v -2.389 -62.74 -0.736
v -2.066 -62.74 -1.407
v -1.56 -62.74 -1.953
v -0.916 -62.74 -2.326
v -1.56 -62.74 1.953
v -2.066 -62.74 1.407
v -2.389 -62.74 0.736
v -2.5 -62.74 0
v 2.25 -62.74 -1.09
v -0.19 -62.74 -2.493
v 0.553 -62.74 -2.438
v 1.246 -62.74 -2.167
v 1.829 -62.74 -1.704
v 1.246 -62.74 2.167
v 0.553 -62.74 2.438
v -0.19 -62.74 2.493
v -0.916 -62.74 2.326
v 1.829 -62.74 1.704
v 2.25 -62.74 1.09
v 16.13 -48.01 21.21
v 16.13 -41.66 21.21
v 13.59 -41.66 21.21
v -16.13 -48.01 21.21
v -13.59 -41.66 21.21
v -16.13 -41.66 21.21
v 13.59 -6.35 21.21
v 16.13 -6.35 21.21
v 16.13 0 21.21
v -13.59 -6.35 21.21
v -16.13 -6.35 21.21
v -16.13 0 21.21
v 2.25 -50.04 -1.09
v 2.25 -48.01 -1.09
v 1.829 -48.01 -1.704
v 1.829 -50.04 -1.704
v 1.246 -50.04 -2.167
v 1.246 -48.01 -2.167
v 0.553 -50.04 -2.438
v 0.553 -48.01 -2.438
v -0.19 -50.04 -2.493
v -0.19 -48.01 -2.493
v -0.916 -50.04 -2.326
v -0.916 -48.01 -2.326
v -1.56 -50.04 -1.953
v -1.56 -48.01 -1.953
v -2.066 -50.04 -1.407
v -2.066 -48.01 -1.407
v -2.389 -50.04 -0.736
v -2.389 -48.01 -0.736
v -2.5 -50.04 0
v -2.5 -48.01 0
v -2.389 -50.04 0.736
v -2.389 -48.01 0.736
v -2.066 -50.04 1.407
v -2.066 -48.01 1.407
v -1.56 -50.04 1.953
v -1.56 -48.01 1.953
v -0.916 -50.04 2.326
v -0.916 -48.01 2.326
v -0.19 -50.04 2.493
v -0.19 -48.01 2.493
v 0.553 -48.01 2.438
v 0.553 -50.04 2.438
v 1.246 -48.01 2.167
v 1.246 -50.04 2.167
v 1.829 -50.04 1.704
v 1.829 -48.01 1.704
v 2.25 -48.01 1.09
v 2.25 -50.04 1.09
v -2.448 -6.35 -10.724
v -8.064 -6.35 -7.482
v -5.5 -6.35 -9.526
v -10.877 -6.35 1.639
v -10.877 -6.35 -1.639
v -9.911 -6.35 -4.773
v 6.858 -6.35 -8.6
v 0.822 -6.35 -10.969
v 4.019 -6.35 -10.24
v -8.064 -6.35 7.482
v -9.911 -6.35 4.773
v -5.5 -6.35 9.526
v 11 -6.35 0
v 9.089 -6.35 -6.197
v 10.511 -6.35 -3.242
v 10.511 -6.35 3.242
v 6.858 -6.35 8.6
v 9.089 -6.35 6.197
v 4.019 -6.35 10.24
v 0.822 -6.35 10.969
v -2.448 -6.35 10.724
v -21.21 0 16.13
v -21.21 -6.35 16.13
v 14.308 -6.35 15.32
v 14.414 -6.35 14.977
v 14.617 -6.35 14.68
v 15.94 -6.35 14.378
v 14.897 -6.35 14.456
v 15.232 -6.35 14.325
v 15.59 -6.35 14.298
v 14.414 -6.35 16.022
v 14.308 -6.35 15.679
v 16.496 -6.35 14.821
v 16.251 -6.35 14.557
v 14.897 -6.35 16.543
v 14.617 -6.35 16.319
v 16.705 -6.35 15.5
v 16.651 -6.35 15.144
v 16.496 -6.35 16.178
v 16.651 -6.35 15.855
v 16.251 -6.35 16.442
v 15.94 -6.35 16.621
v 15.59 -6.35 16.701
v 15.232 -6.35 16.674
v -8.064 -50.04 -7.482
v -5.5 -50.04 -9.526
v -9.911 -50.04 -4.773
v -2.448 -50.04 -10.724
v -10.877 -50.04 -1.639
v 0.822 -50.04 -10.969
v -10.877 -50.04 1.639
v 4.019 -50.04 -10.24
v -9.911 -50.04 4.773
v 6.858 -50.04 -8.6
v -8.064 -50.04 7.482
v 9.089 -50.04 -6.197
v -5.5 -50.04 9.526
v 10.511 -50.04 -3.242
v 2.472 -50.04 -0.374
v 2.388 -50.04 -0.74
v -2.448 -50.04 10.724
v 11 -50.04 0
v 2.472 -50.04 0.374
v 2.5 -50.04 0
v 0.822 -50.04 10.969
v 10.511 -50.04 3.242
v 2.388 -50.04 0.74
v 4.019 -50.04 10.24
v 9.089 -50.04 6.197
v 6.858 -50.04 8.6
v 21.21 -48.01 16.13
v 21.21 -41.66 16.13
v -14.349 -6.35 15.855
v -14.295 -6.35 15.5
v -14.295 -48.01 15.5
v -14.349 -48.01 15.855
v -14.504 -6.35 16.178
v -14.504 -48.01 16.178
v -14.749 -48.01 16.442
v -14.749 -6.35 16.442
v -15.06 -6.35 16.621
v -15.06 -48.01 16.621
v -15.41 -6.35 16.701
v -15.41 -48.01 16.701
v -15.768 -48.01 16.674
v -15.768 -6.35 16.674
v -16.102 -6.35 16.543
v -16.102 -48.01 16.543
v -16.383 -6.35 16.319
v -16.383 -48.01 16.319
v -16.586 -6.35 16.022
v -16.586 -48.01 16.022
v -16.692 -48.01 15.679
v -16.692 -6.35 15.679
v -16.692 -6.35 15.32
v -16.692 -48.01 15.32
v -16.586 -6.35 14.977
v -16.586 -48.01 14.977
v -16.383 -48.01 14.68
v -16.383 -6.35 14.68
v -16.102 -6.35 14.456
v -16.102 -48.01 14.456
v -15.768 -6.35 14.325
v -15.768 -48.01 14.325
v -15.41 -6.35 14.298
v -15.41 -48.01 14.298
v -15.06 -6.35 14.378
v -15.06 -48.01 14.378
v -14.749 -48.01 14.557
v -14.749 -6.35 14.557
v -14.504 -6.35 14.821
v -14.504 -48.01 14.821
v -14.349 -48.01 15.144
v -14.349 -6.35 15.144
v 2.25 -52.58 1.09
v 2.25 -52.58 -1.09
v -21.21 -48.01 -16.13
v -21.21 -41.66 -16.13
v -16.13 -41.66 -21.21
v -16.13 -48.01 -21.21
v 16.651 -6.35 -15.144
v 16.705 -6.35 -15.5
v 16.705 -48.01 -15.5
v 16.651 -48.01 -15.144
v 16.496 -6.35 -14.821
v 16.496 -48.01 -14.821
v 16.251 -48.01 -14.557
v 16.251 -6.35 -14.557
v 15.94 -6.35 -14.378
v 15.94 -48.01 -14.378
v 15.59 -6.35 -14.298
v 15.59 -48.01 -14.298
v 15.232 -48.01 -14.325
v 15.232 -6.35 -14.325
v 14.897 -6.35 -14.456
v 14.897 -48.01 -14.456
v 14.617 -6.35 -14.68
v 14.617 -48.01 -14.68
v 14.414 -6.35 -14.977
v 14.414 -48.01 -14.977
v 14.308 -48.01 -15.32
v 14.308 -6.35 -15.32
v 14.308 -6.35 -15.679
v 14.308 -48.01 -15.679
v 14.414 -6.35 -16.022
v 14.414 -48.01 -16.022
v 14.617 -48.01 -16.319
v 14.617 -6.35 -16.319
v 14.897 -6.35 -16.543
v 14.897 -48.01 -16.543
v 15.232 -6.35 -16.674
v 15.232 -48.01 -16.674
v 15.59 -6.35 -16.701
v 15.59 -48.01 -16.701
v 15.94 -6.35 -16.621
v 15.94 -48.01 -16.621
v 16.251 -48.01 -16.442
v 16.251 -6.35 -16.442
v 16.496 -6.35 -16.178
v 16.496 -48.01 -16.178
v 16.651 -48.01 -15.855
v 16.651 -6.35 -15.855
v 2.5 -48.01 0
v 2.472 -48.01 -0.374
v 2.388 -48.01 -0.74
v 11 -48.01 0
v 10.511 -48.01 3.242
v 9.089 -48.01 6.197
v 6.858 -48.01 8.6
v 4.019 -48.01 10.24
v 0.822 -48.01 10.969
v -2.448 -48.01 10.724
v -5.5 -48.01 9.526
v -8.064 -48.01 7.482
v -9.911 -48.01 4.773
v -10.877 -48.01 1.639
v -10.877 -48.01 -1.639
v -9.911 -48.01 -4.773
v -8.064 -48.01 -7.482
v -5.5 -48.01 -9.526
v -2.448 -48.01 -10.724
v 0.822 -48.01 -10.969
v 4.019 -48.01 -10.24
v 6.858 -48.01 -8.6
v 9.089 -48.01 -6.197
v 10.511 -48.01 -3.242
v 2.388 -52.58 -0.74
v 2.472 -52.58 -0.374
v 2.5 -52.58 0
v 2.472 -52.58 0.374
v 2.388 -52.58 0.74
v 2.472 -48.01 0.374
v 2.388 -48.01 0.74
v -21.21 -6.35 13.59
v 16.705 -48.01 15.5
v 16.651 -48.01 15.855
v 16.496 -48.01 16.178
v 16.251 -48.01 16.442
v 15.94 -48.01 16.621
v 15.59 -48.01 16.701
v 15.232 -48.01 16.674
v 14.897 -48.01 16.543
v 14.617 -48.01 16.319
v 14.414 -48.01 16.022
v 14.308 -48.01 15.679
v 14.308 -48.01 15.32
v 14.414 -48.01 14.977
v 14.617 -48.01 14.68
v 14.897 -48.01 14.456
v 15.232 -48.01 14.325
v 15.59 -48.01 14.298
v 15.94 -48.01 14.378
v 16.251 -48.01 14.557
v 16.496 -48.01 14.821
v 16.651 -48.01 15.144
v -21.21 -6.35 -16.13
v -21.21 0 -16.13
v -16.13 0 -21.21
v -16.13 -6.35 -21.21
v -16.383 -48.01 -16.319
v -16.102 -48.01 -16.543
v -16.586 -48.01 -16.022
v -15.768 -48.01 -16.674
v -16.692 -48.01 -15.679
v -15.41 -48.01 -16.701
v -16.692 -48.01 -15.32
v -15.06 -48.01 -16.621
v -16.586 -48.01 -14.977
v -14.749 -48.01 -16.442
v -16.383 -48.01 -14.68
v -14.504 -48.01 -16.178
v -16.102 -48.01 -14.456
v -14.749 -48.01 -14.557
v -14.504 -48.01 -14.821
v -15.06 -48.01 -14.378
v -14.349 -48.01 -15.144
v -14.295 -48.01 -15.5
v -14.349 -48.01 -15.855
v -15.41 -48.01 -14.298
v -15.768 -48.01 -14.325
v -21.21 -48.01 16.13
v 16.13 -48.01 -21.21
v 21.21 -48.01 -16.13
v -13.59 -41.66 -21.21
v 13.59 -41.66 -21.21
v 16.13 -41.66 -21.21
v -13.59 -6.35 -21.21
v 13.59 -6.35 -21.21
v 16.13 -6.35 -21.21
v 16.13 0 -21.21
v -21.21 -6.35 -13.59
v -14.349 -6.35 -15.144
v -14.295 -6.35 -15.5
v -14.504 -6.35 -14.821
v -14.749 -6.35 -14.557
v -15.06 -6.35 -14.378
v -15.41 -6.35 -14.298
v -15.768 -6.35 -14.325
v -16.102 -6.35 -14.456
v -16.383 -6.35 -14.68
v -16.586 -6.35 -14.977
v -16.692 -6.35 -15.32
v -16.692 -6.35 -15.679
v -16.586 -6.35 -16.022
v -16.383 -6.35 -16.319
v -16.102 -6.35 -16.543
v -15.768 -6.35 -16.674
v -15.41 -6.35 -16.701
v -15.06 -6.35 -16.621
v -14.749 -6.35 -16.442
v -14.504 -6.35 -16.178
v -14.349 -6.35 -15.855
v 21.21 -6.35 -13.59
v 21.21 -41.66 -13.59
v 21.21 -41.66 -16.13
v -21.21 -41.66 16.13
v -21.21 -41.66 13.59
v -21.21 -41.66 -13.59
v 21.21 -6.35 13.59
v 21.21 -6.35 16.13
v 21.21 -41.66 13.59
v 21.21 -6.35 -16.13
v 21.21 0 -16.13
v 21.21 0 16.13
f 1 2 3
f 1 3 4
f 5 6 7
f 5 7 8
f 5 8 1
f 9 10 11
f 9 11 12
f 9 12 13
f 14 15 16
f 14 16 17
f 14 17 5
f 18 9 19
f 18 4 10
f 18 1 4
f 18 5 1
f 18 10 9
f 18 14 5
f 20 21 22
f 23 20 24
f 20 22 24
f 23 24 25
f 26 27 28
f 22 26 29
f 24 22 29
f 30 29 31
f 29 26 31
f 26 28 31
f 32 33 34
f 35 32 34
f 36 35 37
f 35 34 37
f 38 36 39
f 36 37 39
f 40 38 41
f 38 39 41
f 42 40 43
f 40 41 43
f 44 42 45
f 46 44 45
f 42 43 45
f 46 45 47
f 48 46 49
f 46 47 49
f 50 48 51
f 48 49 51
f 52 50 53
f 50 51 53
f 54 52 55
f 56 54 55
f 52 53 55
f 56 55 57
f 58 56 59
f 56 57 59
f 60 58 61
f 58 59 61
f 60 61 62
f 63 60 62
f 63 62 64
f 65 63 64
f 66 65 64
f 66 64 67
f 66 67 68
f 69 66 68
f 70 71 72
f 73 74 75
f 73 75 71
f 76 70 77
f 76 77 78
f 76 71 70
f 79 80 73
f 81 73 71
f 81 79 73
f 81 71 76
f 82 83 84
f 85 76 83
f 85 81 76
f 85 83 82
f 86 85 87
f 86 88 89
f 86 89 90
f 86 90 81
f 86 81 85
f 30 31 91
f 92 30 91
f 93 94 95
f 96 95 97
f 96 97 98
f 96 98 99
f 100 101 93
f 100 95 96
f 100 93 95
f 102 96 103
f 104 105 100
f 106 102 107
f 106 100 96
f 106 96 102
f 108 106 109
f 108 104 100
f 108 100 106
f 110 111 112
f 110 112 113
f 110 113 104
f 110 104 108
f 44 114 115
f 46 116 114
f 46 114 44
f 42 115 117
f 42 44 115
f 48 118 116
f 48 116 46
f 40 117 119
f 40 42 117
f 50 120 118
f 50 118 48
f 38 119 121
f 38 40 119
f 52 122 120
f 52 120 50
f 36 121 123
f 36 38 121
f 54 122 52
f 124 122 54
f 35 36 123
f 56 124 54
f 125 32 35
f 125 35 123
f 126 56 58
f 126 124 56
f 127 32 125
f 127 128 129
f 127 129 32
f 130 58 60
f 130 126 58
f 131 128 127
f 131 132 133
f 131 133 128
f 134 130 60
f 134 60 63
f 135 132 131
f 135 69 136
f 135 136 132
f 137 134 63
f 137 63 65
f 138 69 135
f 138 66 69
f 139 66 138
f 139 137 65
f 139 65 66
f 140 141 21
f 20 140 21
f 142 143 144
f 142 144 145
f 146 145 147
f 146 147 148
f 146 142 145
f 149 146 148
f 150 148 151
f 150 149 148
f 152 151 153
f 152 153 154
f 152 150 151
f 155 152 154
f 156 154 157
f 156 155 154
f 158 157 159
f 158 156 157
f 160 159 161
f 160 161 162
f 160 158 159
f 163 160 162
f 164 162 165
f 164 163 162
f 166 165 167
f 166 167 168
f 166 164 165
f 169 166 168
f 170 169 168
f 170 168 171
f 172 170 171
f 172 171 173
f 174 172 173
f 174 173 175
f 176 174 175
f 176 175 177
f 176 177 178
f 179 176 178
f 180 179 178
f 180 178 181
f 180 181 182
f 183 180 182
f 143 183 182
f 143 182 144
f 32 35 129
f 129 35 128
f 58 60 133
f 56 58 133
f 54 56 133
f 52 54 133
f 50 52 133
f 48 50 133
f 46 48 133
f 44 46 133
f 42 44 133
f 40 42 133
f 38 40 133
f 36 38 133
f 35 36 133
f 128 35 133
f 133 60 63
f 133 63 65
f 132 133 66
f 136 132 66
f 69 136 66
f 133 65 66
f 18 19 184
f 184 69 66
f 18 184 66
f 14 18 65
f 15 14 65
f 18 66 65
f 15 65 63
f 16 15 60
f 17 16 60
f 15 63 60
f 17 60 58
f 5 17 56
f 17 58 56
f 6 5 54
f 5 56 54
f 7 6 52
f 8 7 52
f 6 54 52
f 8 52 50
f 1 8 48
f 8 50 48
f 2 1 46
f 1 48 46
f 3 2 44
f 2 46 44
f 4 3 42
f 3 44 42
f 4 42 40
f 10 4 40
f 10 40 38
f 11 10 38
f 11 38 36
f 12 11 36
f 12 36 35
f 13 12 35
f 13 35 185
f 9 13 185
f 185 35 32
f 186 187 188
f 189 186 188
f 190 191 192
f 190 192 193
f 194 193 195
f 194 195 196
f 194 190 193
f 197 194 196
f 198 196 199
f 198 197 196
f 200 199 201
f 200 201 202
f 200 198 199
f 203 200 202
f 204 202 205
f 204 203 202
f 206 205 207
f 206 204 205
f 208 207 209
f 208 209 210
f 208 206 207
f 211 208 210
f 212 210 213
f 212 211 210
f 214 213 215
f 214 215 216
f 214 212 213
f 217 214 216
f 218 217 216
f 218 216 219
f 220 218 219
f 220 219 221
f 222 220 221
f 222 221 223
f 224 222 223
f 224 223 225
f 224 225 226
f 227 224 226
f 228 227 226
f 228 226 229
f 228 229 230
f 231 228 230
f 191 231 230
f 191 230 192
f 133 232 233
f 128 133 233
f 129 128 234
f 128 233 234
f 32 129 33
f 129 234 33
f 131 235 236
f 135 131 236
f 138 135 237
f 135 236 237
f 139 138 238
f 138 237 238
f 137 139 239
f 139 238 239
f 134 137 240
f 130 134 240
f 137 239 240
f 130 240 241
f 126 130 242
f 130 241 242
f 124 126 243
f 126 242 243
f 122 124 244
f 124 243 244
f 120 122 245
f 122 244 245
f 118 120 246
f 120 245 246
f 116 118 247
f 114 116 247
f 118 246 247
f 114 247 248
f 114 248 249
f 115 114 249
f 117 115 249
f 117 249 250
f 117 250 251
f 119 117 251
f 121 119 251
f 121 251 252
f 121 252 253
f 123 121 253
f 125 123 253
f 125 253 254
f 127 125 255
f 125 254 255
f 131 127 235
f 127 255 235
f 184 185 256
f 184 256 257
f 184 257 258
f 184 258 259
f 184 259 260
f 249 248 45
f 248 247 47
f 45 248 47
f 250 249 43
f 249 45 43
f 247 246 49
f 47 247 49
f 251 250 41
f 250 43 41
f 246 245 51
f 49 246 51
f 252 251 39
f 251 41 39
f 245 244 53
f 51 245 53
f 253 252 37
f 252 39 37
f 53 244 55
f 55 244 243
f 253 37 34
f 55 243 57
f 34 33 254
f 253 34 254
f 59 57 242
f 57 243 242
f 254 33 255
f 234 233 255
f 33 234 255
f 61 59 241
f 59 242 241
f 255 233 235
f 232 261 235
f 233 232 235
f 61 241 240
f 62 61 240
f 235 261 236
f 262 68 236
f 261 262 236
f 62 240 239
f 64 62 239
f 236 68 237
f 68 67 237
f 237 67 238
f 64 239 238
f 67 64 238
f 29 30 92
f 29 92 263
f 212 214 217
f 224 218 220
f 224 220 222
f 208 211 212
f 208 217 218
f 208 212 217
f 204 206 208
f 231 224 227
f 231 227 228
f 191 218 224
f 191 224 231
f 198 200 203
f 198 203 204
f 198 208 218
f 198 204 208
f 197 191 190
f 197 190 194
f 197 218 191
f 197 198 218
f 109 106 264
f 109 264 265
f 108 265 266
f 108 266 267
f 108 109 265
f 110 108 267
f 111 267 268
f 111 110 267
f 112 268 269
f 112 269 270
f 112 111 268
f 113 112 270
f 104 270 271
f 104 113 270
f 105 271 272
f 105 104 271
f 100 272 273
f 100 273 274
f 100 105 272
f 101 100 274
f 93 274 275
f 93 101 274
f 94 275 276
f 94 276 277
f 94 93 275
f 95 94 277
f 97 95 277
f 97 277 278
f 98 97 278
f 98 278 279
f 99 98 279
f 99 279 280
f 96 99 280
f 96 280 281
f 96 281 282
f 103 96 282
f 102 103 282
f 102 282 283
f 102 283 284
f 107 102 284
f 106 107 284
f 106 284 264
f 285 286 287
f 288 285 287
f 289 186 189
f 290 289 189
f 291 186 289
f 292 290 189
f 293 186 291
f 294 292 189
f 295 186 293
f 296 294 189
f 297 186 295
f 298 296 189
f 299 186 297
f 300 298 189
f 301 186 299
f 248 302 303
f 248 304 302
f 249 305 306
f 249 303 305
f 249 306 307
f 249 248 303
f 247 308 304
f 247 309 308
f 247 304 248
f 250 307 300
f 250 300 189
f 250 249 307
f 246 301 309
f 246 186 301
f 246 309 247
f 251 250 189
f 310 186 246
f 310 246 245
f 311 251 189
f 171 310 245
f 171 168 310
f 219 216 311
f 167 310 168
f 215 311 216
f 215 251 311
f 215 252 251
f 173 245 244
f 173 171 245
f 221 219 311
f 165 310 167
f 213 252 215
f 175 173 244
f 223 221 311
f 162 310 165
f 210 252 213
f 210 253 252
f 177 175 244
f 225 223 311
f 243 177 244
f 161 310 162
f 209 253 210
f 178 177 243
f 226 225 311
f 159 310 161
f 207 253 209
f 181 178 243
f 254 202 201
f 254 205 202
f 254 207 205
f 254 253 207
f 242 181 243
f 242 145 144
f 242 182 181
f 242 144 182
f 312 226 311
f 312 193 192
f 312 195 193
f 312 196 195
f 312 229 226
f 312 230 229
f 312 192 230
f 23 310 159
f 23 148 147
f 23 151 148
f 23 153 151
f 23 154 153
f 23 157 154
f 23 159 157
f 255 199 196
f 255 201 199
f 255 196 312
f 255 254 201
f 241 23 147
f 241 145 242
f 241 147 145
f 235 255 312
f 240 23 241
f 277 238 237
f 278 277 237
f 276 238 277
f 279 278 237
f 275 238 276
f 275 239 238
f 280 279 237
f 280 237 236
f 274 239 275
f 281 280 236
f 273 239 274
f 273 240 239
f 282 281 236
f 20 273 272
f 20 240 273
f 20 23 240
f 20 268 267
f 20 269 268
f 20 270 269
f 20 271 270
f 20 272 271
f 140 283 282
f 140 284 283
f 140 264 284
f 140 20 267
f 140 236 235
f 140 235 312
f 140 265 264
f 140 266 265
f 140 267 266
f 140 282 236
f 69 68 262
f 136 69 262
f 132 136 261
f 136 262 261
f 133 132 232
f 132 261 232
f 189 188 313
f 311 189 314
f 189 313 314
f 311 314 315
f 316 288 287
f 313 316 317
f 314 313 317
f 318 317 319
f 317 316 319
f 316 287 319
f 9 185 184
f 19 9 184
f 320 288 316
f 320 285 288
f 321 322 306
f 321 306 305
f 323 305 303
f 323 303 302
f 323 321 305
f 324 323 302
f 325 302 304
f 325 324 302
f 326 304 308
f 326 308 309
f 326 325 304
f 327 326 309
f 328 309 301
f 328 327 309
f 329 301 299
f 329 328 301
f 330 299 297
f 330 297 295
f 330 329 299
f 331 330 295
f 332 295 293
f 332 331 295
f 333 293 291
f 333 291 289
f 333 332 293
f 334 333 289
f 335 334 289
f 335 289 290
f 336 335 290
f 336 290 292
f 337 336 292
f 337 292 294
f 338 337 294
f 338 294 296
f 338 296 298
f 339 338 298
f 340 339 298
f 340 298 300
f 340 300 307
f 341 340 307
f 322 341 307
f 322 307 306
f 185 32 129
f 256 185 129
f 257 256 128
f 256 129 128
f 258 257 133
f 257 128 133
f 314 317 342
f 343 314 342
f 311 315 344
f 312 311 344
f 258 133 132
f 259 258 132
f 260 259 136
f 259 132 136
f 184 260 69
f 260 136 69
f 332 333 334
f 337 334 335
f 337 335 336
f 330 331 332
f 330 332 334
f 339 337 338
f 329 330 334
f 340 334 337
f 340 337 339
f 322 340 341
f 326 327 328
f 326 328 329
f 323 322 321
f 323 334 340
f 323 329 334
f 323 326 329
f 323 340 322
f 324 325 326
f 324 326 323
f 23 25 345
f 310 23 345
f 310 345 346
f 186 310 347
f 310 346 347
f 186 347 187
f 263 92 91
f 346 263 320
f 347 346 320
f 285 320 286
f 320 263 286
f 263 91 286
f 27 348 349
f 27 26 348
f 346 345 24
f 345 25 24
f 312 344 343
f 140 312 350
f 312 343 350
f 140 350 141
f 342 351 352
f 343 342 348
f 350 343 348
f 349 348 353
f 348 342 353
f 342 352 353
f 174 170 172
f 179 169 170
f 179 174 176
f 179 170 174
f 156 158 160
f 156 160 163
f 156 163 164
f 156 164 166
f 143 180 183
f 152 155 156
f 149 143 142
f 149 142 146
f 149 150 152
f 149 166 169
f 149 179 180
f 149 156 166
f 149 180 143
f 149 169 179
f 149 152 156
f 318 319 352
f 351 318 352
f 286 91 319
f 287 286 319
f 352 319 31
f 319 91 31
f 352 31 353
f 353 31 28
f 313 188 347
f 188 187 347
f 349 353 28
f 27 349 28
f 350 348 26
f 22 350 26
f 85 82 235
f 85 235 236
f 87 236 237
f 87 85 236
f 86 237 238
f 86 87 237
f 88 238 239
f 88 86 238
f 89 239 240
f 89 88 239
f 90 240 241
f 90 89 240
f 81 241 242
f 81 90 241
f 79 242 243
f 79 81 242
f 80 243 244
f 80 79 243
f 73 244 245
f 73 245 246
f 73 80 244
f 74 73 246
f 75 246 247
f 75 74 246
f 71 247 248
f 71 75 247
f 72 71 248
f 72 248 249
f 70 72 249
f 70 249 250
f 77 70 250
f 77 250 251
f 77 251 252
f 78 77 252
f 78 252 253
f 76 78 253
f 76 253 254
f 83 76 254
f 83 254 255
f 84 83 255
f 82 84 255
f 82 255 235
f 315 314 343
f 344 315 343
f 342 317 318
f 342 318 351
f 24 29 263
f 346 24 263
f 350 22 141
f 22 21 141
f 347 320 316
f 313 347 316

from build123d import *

# Parameters (mm, degrees)
F1_START = 52.58
F1_DEPTH = 10.16
F2_START = 50.04
F2_DEPTH = 2.54
F3_START = 48.01
F0_R     = 11
F3_DEPTH = 2.03
F4_START = 41.66
F0_R_2   = 1.205
F4_DEPTH = 6.35
F5_START = 6.35
F5_DEPTH = 35.31
F6_DEPTH = 6.35


with BuildPart() as f1:
    # F0 (on Front) → F1 (new body)
    with BuildSketch(Plane.XZ.offset(F1_START)):
        with BuildLine():
            Line((2.25, -1.0897247359), (2.25, 1.0897247359))
            ThreePointArc((2.25, 1.0897247359), (-2.5, 0), (2.25, -1.0897247359))
        make_face()
    extrude(amount=F1_DEPTH)

    # F0 (on Front) → F2 (join)
    with BuildSketch(Plane.XZ.offset(F2_START)):
        with BuildLine():
            ThreePointArc((2.25, -1.0897247359), (2.4366985862, -0.5590169944), (2.5, 0))
            ThreePointArc((2.5, 0), (2.4366985862, 0.5590169944), (2.25, 1.0897247359))
            Line((2.25, 1.0897247359), (2.25, -1.0897247359))
        make_face()
        with BuildLine():
            Line((2.25, -1.0897247359), (2.25, 1.0897247359))
            ThreePointArc((2.25, 1.0897247359), (-2.5, 0), (2.25, -1.0897247359))
        make_face()
    extrude(amount=F2_DEPTH)


with BuildPart() as f3:
    # F0 (on Front) → F3 (new body)
    with BuildSketch(Plane.XZ.offset(F3_START)):
        Circle(F0_R)
        with BuildLine():
            ThreePointArc((2.25, -1.0897247359), (-2.5, 0), (2.25, 1.0897247359))
            Line((2.25, 1.0897247359), (2.25, 2.5))
            Line((2.25, 2.5), (2.75, 2.5))
            Line((2.75, 2.5), (2.75, -2.5))
            Line((2.75, -2.5), (2.25, -2.5))
            Line((2.25, -2.5), (2.25, -1.0897247359))
        make_face(mode=Mode.SUBTRACT)
        with BuildLine():
            ThreePointArc((2.25, 1.0897247359), (2.4366985862, 0.5590169944), (2.5, 0))
            ThreePointArc((2.5, 0), (2.4366985862, -0.5590169944), (2.25, -1.0897247359))
            Line((2.25, -1.0897247359), (2.25, -2.5))
            Line((2.25, -2.5), (2.75, -2.5))
            Line((2.75, -2.5), (2.75, 2.5))
            Line((2.75, 2.5), (2.25, 2.5))
            Line((2.25, 2.5), (2.25, 1.0897247359))
        make_face()
    extrude(amount=F3_DEPTH)


with BuildPart() as f4:
    # F0 (on Front) → F4 (new body)
    with BuildSketch(Plane.XZ.offset(F4_START)):
        Polygon((-21.21, -13.59), (-13.59, -21.21), (13.59, -21.21), (21.21, -13.59), (21.21, 13.59), (13.59, 21.21), (-13.59, 21.21), (-21.21, 13.59), align=None)
        with Locations((-15.5, -15.4995612841)):
            Circle(F0_R_2, mode=Mode.SUBTRACT)
        with Locations((15.5, -15.4995612841)):
            Circle(F0_R_2, mode=Mode.SUBTRACT)
        with Locations((-15.5, 15.4995612841)):
            Circle(F0_R_2, mode=Mode.SUBTRACT)
        Circle(F0_R, mode=Mode.SUBTRACT)
        with Locations((15.5, 15.4995612841)):
            Circle(F0_R_2, mode=Mode.SUBTRACT)
        Polygon((13.59, 21.21), (21.21, 13.59), (21.21, 16.13), (16.13, 21.21), align=None)
        Polygon((21.21, -13.59), (13.59, -21.21), (16.13, -21.21), (21.21, -16.13), align=None)
        Polygon((-21.21, -16.13), (-16.13, -21.21), (-13.59, -21.21), (-21.21, -13.59), align=None)
        Polygon((-21.21, 16.13), (-21.21, 13.59), (-13.59, 21.21), (-16.13, 21.21), align=None)
    extrude(amount=F4_DEPTH)

    # F0 (on Front) → F5 (join)
    with BuildSketch(Plane.XZ.offset(F5_START)):
        Polygon((-21.21, -13.59), (-13.59, -21.21), (13.59, -21.21), (21.21, -13.59), (21.21, 13.59), (13.59, 21.21), (-13.59, 21.21), (-21.21, 13.59), align=None)
        with Locations((-15.5, -15.4995612841)):
            Circle(F0_R_2, mode=Mode.SUBTRACT)
        with Locations((15.5, -15.4995612841)):
            Circle(F0_R_2, mode=Mode.SUBTRACT)
        with Locations((-15.5, 15.4995612841)):
            Circle(F0_R_2, mode=Mode.SUBTRACT)
        Circle(F0_R, mode=Mode.SUBTRACT)
        with Locations((15.5, 15.4995612841)):
            Circle(F0_R_2, mode=Mode.SUBTRACT)
    extrude(amount=F5_DEPTH)

    # F0 (on Front) → F6 (join)
    with BuildSketch(Plane.XZ):
        Polygon((-21.21, -13.59), (-13.59, -21.21), (13.59, -21.21), (21.21, -13.59), (21.21, 13.59), (13.59, 21.21), (-13.59, 21.21), (-21.21, 13.59), align=None)
        with Locations((-15.5, -15.4995612841)):
            Circle(F0_R_2, mode=Mode.SUBTRACT)
        with Locations((15.5, -15.4995612841)):
            Circle(F0_R_2, mode=Mode.SUBTRACT)
        with Locations((-15.5, 15.4995612841)):
            Circle(F0_R_2, mode=Mode.SUBTRACT)
        Circle(F0_R, mode=Mode.SUBTRACT)
        with Locations((15.5, 15.4995612841)):
            Circle(F0_R_2, mode=Mode.SUBTRACT)
        Circle(F0_R)
        with BuildLine():
            ThreePointArc((2.25, -1.0897247359), (-2.5, 0), (2.25, 1.0897247359))
            Line((2.25, 1.0897247359), (2.25, 2.5))
            Line((2.25, 2.5), (2.75, 2.5))
            Line((2.75, 2.5), (2.75, -2.5))
            Line((2.75, -2.5), (2.25, -2.5))
            Line((2.25, -2.5), (2.25, -1.0897247359))
        make_face(mode=Mode.SUBTRACT)
        with BuildLine():
            Line((2.25, -1.0897247359), (2.25, 1.0897247359))
            ThreePointArc((2.25, 1.0897247359), (-2.5, 0), (2.25, -1.0897247359))
        make_face()
        Polygon((-21.21, -16.13), (-16.13, -21.21), (-13.59, -21.21), (-21.21, -13.59), align=None)
        Polygon((-21.21, 16.13), (-21.21, 13.59), (-13.59, 21.21), (-16.13, 21.21), align=None)
        Polygon((13.59, 21.21), (21.21, 13.59), (21.21, 16.13), (16.13, 21.21), align=None)
        Polygon((21.21, -13.59), (13.59, -21.21), (16.13, -21.21), (21.21, -16.13), align=None)
        with Locations((15.5, -15.4995612841)):
            Circle(F0_R_2)
        with Locations((15.5, 15.4995612841)):
            Circle(F0_R_2)
        with Locations((-15.5, 15.4995612841)):
            Circle(F0_R_2)
        with Locations((-15.5, -15.4995612841)):
            Circle(F0_R_2)
        with BuildLine():
            ThreePointArc((2.25, 1.0897247359), (2.4366985862, 0.5590169944), (2.5, 0))
            ThreePointArc((2.5, 0), (2.4366985862, -0.5590169944), (2.25, -1.0897247359))
            Line((2.25, -1.0897247359), (2.25, -2.5))
            Line((2.25, -2.5), (2.75, -2.5))
            Line((2.75, -2.5), (2.75, 2.5))
            Line((2.75, 2.5), (2.25, 2.5))
            Line((2.25, 2.5), (2.25, 1.0897247359))
        make_face()
        with BuildLine():
            ThreePointArc((2.25, -1.0897247359), (2.4366985862, -0.5590169944), (2.5, 0))
            ThreePointArc((2.5, 0), (2.4366985862, 0.5590169944), (2.25, 1.0897247359))
            Line((2.25, 1.0897247359), (2.25, -1.0897247359))
        make_face()
    extrude(amount=F6_DEPTH)


solid = Compound([f1.part, f3.part, f4.part])
